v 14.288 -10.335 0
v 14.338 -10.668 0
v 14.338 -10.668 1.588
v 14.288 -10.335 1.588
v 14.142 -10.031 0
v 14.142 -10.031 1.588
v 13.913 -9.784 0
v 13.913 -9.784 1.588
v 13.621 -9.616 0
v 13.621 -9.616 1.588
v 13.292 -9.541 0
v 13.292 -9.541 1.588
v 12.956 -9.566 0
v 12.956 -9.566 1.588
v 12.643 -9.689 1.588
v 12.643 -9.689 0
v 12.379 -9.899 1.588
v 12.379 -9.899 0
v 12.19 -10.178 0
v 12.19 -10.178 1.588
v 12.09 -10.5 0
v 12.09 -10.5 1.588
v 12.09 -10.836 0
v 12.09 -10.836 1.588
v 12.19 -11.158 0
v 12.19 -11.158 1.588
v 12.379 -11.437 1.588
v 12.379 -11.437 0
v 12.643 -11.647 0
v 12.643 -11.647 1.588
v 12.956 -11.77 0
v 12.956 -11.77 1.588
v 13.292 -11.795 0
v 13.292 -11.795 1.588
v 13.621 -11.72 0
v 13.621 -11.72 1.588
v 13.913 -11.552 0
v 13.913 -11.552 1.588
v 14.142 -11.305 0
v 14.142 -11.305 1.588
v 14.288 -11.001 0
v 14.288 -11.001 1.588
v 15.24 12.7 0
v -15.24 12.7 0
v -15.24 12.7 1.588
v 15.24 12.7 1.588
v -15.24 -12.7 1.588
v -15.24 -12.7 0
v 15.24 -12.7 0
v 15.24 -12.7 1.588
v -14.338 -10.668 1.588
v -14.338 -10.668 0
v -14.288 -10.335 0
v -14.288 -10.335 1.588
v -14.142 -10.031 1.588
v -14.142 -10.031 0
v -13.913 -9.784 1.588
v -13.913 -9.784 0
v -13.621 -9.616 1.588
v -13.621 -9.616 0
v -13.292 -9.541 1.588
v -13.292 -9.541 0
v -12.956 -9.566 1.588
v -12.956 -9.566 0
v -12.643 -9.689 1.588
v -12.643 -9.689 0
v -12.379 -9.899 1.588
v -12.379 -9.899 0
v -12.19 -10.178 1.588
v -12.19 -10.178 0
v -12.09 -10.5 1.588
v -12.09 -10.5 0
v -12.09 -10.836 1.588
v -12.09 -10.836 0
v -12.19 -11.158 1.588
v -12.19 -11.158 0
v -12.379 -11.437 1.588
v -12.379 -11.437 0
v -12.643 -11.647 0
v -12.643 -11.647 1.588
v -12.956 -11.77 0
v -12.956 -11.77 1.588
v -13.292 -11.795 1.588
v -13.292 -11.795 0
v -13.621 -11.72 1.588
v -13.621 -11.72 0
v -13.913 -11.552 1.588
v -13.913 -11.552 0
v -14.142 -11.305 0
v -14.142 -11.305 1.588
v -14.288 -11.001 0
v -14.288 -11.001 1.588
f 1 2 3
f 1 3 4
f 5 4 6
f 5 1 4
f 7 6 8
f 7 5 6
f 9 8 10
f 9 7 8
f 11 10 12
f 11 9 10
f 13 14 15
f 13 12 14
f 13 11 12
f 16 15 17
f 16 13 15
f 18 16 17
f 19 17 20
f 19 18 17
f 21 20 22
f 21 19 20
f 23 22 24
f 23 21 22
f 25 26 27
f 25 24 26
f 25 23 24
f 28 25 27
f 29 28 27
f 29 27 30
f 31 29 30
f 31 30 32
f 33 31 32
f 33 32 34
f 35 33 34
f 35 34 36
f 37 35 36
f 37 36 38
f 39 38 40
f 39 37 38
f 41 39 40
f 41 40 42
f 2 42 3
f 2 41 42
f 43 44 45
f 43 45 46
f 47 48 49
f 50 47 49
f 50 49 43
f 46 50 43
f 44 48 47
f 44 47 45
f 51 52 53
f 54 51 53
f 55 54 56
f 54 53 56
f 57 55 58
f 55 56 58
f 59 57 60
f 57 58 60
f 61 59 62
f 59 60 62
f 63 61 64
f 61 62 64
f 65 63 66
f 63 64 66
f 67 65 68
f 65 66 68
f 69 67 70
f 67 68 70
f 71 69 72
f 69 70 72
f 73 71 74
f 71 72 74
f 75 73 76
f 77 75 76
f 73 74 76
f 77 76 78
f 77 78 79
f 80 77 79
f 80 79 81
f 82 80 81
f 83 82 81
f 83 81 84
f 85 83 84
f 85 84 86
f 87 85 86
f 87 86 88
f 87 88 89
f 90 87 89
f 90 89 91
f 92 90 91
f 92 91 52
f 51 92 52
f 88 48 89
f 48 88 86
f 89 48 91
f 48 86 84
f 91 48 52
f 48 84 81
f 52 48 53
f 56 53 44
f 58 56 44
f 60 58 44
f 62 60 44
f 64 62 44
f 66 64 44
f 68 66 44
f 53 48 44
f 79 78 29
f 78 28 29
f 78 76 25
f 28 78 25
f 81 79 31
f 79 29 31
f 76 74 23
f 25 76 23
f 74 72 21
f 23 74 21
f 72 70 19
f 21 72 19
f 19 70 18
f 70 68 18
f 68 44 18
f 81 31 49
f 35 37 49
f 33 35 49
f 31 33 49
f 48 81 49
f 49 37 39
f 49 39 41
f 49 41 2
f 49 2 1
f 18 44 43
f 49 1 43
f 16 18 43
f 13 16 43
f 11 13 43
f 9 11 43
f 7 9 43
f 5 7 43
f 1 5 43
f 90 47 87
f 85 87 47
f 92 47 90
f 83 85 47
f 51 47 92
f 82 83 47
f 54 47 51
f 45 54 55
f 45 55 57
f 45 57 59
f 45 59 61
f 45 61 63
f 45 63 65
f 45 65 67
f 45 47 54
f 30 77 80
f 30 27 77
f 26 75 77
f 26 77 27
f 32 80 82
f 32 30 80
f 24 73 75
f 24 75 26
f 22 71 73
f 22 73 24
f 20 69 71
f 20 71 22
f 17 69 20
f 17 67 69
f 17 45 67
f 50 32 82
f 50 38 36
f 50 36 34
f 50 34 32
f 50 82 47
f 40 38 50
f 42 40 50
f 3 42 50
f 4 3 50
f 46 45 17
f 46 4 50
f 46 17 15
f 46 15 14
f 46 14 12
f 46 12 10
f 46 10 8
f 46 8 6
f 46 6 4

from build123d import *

# Parameters (mm, degrees)
SKETCH1_W                 = 30.48
SKETCH1_H                 = 25.4
BOSS_EXTRUDE1_DEPTH       = 1.5875
F_2_CLEARANCE_HOLE1_D     = 2.2606
F_2_CLEARANCE_HOLE1_DEPTH = 1.5885


with BuildPart() as part:
    # Sketch1 → Boss-Extrude1 (new body)
    with BuildSketch(Plane.XY):
        Rectangle(SKETCH1_W, SKETCH1_H)
    extrude(amount=BOSS_EXTRUDE1_DEPTH)

    # #2 Clearance Hole1
    with Locations(Plane.XY.offset(1.5875)):
        with Locations((-13.208, -10.668)):
            f_2_clearance_hole1 = Hole(F_2_CLEARANCE_HOLE1_D / 2, depth=F_2_CLEARANCE_HOLE1_DEPTH)

    # Mirror1: #2 Clearance Hole1 across plane
    add(f_2_clearance_hole1.mirror(Plane(origin=(0, 0, 0), x_dir=(0, 0, 1), z_dir=(1, 0, 0))), mode=Mode.SUBTRACT)


solid = part.part
